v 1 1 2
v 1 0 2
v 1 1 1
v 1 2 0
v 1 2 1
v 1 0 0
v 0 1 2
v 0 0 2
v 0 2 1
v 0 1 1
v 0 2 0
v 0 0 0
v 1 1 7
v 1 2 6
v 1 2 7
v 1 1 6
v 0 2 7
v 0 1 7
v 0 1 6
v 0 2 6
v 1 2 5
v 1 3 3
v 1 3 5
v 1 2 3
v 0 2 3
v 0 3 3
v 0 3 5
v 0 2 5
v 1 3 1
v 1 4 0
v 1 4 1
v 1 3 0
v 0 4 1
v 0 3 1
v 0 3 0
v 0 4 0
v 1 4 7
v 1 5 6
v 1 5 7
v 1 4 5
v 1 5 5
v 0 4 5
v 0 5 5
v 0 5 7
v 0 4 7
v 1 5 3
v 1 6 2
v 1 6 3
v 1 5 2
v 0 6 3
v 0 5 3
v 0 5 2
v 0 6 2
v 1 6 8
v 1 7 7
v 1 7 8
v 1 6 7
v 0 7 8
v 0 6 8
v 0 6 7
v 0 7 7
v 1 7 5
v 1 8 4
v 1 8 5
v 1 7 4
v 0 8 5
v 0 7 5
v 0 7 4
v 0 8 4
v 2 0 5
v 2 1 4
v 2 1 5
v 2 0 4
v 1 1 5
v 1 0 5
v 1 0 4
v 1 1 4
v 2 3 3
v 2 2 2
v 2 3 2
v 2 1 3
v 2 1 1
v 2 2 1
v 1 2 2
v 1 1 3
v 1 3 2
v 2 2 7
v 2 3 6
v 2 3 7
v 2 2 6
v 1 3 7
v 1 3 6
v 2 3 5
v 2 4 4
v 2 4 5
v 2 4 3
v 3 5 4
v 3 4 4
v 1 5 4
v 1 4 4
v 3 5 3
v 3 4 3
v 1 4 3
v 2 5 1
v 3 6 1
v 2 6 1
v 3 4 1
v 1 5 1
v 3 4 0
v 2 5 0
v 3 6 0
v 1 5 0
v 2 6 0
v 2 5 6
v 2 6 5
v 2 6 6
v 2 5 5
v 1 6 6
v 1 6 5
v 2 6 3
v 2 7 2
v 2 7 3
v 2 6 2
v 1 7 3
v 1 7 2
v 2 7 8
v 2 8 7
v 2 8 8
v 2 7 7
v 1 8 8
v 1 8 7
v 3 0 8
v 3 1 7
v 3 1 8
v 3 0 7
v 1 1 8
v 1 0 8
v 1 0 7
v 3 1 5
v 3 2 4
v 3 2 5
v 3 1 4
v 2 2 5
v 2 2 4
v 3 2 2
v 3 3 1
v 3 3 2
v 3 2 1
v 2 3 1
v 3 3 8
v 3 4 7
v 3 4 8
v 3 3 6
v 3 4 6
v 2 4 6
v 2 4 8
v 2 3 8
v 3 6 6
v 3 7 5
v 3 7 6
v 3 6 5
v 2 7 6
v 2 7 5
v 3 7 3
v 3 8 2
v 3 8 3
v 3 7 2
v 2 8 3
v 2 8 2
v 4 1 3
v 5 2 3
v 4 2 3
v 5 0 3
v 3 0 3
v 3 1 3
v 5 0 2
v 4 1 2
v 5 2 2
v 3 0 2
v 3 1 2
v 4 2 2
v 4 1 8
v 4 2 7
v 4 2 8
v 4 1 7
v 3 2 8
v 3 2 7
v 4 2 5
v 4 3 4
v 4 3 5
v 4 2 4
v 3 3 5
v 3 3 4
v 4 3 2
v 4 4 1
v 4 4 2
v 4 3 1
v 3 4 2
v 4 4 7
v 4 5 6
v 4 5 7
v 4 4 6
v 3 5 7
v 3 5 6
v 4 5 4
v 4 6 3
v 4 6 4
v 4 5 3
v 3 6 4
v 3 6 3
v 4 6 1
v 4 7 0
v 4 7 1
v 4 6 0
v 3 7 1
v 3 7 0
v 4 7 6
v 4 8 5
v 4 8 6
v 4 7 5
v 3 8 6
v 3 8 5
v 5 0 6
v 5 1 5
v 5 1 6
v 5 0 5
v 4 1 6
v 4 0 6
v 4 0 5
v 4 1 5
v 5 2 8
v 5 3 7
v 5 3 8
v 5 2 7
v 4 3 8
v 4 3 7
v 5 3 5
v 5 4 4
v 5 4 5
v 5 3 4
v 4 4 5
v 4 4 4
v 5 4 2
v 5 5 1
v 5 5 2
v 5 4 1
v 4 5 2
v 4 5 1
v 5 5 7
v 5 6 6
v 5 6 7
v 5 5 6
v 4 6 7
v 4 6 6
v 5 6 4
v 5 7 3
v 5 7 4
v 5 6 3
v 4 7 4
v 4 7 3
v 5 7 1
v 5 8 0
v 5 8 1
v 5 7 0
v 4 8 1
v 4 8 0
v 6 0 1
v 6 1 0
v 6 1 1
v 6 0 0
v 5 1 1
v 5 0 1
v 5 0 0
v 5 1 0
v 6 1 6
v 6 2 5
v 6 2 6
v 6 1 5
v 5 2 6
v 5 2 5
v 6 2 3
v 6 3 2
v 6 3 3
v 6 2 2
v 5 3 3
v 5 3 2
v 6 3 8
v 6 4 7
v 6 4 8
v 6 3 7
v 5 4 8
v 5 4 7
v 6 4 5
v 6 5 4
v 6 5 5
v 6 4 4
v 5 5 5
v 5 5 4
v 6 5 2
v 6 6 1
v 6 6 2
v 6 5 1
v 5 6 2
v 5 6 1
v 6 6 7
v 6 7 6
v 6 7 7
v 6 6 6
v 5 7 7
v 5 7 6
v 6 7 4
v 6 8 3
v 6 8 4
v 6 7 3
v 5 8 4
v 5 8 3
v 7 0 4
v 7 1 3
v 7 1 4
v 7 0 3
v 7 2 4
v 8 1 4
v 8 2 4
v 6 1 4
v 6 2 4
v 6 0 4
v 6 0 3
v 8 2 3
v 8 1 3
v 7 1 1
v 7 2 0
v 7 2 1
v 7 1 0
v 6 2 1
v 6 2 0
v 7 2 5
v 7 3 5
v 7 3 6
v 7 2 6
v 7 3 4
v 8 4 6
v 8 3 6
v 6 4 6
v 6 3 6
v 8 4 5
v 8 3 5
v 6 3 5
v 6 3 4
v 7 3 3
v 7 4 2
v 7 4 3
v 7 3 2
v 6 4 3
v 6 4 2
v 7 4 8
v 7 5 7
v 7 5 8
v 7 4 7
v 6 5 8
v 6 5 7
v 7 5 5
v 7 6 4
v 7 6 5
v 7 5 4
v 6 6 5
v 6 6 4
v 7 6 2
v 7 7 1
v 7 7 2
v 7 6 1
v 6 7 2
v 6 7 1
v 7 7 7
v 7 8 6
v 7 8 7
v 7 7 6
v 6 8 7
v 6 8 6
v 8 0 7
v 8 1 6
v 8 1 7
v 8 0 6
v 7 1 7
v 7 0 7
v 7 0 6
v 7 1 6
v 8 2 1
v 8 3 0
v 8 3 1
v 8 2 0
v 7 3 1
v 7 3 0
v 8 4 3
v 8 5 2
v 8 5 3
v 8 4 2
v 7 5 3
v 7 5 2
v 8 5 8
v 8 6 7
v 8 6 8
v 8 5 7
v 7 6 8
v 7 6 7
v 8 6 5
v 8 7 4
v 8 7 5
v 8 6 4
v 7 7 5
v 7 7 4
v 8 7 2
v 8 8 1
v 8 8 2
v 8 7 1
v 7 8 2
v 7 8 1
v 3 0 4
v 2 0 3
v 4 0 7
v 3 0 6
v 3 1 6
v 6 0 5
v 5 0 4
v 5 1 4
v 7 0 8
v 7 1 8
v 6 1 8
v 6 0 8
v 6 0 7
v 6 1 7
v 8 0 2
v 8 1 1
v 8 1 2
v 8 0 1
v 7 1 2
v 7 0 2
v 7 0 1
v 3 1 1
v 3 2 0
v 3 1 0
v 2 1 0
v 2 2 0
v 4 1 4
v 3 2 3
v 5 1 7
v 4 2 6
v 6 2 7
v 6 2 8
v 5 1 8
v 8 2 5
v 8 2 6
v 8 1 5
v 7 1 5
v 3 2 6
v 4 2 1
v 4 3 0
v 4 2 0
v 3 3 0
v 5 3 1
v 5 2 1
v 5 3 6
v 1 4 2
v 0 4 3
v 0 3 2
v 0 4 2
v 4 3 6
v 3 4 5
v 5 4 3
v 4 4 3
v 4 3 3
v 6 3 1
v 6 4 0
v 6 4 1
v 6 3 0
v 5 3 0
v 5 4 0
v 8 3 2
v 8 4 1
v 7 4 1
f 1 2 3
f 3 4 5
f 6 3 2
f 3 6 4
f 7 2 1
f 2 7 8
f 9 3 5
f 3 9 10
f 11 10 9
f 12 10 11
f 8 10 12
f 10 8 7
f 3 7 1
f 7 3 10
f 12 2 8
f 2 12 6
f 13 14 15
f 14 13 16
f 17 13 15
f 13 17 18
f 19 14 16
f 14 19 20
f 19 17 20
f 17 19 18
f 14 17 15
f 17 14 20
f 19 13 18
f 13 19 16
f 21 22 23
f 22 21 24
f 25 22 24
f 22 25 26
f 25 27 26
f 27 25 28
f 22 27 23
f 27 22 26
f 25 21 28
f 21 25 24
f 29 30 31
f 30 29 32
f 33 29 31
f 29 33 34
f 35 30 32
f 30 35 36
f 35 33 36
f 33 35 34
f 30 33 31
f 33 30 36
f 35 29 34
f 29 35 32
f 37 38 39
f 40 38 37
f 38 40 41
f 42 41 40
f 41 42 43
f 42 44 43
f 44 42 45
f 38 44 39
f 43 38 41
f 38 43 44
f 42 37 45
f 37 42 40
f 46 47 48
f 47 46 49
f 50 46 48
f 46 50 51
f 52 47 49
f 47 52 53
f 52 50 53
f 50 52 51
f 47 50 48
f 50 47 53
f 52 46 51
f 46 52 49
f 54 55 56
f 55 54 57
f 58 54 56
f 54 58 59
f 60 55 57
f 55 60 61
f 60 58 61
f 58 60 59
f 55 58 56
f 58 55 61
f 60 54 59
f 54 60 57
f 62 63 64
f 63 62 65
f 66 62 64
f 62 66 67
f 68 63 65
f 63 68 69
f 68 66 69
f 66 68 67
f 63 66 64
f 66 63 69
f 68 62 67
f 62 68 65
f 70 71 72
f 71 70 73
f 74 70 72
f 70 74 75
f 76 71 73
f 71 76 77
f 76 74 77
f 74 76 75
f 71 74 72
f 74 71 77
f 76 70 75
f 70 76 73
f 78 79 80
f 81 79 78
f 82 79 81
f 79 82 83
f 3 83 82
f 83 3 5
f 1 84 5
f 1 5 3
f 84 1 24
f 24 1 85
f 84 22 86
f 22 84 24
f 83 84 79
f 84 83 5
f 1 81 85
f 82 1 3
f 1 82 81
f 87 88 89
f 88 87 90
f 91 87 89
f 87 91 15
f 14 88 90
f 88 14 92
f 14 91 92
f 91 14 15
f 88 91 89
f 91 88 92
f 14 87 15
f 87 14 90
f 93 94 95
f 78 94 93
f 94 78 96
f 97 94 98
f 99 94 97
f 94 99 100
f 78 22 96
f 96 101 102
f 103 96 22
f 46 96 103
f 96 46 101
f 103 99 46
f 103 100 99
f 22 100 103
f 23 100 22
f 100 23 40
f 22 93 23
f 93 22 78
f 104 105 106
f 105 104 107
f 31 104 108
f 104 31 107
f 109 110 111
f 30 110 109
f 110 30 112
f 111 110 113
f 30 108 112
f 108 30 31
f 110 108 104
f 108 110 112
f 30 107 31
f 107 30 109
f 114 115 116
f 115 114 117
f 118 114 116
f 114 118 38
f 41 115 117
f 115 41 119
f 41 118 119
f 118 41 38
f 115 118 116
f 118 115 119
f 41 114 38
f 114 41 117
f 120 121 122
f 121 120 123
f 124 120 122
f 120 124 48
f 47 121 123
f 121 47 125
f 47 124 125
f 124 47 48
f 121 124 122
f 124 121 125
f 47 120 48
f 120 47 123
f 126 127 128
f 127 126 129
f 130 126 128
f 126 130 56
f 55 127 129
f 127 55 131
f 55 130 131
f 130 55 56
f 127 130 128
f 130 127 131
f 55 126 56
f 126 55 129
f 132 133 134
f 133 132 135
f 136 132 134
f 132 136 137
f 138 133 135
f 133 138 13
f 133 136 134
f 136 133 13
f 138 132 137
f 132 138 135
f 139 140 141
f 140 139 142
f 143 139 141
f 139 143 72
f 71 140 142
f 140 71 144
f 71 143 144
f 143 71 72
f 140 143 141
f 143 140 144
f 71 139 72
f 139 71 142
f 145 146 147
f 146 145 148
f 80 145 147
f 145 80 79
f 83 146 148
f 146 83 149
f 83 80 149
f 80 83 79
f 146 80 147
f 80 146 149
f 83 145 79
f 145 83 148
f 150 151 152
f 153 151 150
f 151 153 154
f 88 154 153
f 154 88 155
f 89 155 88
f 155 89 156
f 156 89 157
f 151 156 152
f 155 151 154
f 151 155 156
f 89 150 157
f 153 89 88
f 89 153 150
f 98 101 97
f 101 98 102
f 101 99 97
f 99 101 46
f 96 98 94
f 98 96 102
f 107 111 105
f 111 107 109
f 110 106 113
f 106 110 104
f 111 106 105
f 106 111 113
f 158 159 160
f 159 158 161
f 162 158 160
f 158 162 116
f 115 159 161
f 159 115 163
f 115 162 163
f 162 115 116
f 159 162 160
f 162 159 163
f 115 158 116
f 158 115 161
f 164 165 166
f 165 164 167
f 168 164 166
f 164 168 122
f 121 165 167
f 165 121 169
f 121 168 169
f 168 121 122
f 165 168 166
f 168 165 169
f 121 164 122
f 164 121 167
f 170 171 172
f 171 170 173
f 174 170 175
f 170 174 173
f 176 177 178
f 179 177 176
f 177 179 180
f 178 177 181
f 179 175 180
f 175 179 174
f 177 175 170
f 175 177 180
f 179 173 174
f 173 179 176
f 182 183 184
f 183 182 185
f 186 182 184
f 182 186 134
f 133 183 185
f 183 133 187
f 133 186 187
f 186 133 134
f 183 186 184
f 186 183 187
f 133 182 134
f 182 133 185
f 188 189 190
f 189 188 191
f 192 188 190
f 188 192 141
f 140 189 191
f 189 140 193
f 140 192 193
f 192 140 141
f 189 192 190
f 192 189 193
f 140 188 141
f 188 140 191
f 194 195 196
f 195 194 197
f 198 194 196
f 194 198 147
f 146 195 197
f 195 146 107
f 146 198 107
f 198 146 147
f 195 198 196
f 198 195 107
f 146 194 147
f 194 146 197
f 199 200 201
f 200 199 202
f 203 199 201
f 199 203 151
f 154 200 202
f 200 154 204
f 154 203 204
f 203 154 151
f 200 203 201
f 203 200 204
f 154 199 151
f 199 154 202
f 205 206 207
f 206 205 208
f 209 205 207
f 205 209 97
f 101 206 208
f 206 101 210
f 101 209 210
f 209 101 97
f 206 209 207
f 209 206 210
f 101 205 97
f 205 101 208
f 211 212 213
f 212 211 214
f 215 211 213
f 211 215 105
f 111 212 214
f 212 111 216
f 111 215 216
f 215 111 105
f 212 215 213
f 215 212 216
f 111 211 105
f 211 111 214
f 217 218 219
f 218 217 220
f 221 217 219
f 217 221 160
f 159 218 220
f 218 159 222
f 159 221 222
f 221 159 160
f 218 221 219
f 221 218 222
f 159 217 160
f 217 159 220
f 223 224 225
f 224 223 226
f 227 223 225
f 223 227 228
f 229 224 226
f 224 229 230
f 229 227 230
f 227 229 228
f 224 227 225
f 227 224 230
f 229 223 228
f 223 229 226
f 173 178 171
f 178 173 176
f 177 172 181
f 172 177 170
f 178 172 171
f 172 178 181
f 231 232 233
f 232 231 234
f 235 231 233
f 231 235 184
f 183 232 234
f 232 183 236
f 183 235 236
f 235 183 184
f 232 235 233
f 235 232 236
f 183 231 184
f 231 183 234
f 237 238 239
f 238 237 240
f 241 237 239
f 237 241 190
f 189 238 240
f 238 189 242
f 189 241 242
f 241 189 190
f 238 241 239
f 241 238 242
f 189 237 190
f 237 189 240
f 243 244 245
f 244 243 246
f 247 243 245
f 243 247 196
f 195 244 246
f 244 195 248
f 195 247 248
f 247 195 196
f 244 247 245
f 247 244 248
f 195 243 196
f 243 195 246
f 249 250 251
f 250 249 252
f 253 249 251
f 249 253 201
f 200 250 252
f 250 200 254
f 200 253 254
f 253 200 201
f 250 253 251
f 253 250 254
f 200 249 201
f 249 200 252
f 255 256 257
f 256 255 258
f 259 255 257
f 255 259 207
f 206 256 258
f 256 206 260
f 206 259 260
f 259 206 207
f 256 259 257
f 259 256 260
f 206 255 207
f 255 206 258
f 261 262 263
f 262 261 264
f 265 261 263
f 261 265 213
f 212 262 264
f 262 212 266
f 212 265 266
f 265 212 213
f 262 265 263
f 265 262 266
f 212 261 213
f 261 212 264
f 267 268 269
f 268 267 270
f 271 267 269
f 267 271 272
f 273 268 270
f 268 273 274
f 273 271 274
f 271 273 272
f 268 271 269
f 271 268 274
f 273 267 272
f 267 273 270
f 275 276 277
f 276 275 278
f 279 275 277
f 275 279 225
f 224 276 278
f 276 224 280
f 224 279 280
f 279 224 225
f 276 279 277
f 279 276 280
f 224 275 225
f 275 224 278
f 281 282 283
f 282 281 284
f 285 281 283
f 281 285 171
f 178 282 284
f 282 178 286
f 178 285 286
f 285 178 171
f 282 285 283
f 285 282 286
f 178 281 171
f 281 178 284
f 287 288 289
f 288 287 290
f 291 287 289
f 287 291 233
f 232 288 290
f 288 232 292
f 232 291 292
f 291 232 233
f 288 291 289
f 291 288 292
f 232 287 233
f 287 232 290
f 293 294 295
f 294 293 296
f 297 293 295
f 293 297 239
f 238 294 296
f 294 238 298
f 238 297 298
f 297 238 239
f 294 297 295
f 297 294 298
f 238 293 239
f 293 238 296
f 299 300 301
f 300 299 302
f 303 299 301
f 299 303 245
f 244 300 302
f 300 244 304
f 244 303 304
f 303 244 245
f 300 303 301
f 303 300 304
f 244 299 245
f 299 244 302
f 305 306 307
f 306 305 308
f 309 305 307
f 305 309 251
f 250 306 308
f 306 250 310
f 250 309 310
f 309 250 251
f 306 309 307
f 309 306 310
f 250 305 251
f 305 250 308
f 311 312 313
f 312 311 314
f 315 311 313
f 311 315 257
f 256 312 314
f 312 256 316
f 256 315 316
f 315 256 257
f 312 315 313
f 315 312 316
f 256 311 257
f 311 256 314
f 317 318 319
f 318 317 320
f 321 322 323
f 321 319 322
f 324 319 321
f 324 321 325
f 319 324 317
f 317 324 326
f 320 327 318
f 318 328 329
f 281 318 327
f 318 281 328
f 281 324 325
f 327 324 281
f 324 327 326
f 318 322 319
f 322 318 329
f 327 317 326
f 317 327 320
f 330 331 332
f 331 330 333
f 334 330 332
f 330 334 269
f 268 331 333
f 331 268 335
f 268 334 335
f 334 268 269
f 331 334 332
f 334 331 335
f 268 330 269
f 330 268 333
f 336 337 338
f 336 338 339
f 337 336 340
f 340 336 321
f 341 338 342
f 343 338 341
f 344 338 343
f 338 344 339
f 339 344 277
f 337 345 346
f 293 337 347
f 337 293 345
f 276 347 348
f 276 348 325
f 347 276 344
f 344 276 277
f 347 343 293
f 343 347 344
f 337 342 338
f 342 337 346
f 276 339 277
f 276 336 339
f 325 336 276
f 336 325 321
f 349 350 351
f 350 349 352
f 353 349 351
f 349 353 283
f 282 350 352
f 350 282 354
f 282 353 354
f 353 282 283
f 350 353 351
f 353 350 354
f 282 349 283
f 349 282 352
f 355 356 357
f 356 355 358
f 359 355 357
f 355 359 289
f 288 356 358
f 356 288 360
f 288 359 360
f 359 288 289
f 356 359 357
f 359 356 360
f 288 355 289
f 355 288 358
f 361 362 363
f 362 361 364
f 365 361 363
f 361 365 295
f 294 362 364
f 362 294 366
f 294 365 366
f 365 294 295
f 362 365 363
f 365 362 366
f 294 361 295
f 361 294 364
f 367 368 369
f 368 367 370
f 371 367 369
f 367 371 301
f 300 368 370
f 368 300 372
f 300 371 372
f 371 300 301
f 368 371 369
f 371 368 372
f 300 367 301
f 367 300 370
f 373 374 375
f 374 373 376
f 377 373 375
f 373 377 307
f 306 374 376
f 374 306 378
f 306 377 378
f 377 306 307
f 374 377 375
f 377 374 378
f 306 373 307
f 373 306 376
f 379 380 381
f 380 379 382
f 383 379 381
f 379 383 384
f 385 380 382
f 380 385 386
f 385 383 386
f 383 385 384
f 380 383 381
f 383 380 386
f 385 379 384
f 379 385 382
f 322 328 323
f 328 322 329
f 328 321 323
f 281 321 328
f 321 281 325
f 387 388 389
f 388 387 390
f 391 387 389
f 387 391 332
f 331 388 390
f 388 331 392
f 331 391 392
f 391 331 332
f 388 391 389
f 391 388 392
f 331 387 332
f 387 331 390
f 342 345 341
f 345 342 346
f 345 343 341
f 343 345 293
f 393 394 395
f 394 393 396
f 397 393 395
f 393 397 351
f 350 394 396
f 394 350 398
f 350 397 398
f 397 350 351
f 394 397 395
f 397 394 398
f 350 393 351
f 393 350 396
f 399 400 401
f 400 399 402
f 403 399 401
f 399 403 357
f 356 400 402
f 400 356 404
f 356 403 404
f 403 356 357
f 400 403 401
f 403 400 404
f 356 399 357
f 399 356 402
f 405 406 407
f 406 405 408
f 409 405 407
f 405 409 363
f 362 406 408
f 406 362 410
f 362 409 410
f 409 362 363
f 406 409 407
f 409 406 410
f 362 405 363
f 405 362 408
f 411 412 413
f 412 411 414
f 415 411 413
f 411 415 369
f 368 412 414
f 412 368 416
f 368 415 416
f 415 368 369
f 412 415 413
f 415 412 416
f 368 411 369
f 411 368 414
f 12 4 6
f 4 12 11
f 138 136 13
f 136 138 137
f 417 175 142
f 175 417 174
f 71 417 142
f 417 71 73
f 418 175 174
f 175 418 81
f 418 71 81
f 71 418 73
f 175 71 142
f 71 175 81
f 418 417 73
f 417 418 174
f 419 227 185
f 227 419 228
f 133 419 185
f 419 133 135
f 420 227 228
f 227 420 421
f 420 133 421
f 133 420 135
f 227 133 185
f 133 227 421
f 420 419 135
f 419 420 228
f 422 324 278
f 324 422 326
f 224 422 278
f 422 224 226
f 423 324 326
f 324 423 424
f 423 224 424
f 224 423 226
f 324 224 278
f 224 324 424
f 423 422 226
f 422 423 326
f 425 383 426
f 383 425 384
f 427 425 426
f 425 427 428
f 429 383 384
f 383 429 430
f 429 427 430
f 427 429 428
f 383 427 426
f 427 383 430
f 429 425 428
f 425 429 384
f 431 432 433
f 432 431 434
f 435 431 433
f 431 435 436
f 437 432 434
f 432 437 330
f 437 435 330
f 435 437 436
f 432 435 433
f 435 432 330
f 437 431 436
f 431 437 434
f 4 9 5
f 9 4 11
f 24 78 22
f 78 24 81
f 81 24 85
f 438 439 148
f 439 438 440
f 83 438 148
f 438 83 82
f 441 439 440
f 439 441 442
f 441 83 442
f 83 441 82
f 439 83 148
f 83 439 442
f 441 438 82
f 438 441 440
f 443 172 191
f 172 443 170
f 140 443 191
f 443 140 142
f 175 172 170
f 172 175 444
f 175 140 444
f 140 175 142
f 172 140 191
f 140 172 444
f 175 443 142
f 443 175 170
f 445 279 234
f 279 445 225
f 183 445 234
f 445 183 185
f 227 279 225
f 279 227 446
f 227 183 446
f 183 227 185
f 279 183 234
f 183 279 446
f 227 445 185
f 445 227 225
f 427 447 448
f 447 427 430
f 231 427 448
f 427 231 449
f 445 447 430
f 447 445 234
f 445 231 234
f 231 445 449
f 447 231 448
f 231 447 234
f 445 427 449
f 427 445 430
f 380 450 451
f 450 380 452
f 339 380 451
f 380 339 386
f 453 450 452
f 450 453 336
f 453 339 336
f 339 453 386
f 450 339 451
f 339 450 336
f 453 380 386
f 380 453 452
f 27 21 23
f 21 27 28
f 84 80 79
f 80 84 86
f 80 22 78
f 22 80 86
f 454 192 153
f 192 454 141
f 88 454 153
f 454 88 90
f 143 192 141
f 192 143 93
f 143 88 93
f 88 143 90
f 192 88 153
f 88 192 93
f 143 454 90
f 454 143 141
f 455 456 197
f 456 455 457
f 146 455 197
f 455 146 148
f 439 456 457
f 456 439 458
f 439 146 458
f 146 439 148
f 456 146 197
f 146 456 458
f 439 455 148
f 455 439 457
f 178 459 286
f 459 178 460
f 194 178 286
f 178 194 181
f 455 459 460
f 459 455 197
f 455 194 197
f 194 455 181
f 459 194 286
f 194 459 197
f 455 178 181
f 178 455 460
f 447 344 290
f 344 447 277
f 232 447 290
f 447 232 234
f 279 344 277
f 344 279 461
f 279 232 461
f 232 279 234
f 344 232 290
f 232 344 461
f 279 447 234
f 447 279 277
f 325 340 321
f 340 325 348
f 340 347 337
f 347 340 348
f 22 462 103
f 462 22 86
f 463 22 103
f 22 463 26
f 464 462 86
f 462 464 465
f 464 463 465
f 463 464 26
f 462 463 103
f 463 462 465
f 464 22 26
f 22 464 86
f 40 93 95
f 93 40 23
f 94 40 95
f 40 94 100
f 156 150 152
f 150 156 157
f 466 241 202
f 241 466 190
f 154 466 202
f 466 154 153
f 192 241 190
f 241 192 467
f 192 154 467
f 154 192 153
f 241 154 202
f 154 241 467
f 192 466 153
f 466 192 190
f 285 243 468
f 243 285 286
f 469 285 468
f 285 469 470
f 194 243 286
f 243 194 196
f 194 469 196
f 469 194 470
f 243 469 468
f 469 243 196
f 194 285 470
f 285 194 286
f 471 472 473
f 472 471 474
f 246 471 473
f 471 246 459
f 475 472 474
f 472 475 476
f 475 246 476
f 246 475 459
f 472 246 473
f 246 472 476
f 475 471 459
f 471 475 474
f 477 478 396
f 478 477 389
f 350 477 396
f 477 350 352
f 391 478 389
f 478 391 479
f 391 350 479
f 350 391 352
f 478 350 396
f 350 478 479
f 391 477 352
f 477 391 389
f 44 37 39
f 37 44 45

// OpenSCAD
union() {
    translate([0, 0, 1]) cube([1, 1, 1]);
    translate([0, 1, 6]) cube([1, 1, 1]);
    translate([0, 2, 3]) cube([1, 1, 1]);
    translate([0, 3, 0]) cube([1, 1, 1]);
    translate([0, 4, 5]) cube([1, 1, 1]);
    translate([0, 5, 2]) cube([1, 1, 1]);
    translate([0, 6, 7]) cube([1, 1, 1]);
    translate([0, 7, 4]) cube([1, 1, 1]);
    translate([1, 0, 4]) cube([1, 1, 1]);
    translate([1, 1, 1]) cube([1, 1, 1]);
    translate([1, 2, 6]) cube([1, 1, 1]);
    translate([1, 3, 3]) cube([1, 1, 1]);
    translate([1, 4, 0]) cube([1, 1, 1]);
    translate([1, 5, 5]) cube([1, 1, 1]);
    translate([1, 6, 2]) cube([1, 1, 1]);
    translate([1, 7, 7]) cube([1, 1, 1]);
    translate([2, 0, 7]) cube([1, 1, 1]);
    translate([2, 1, 4]) cube([1, 1, 1]);
    translate([2, 2, 1]) cube([1, 1, 1]);
    translate([2, 3, 6]) cube([1, 1, 1]);
    translate([2, 4, 3]) cube([1, 1, 1]);
    translate([2, 5, 0]) cube([1, 1, 1]);
    translate([2, 6, 5]) cube([1, 1, 1]);
    translate([2, 7, 2]) cube([1, 1, 1]);
    translate([3, 0, 2]) cube([1, 1, 1]);
    translate([3, 1, 7]) cube([1, 1, 1]);
    translate([3, 2, 4]) cube([1, 1, 1]);
    translate([3, 3, 1]) cube([1, 1, 1]);
    translate([3, 4, 6]) cube([1, 1, 1]);
    translate([3, 5, 3]) cube([1, 1, 1]);
    translate([3, 6, 0]) cube([1, 1, 1]);
    translate([3, 7, 5]) cube([1, 1, 1]);
    translate([4, 0, 5]) cube([1, 1, 1]);
    translate([4, 1, 2]) cube([1, 1, 1]);
    translate([4, 2, 7]) cube([1, 1, 1]);
    translate([4, 3, 4]) cube([1, 1, 1]);
    translate([4, 4, 1]) cube([1, 1, 1]);
    translate([4, 5, 6]) cube([1, 1, 1]);
    translate([4, 6, 3]) cube([1, 1, 1]);
    translate([4, 7, 0]) cube([1, 1, 1]);
    translate([5, 0, 0]) cube([1, 1, 1]);
    translate([5, 1, 5]) cube([1, 1, 1]);
    translate([5, 2, 2]) cube([1, 1, 1]);
    translate([5, 3, 7]) cube([1, 1, 1]);
    translate([5, 4, 4]) cube([1, 1, 1]);
    translate([5, 5, 1]) cube([1, 1, 1]);
    translate([5, 6, 6]) cube([1, 1, 1]);
    translate([5, 7, 3]) cube([1, 1, 1]);
    translate([6, 0, 3]) cube([1, 1, 1]);
    translate([6, 1, 0]) cube([1, 1, 1]);
    translate([6, 2, 5]) cube([1, 1, 1]);
    translate([6, 3, 2]) cube([1, 1, 1]);
    translate([6, 4, 7]) cube([1, 1, 1]);
    translate([6, 5, 4]) cube([1, 1, 1]);
    translate([6, 6, 1]) cube([1, 1, 1]);
    translate([6, 7, 6]) cube([1, 1, 1]);
    translate([7, 0, 6]) cube([1, 1, 1]);
    translate([7, 1, 3]) cube([1, 1, 1]);
    translate([7, 2, 0]) cube([1, 1, 1]);
    translate([7, 3, 5]) cube([1, 1, 1]);
    translate([7, 4, 2]) cube([1, 1, 1]);
    translate([7, 5, 7]) cube([1, 1, 1]);
    translate([7, 6, 4]) cube([1, 1, 1]);
    translate([7, 7, 1]) cube([1, 1, 1]);
    translate([0, 0, 0]) cube([1, 1, 1]);
    translate([1, 0, 7]) cube([1, 1, 1]);
    translate([2, 0, 3]) cube([1, 1, 1]);
    translate([3, 0, 6]) cube([1, 1, 1]);
    translate([4, 0, 2]) cube([1, 1, 1]);
    translate([5, 0, 4]) cube([1, 1, 1]);
    translate([6, 0, 7]) cube([1, 1, 1]);
    translate([7, 0, 1]) cube([1, 1, 1]);
    translate([0, 1, 0]) cube([1, 1, 1]);
    translate([1, 1, 2]) cube([1, 1, 1]);
    translate([2, 1, 0]) cube([1, 1, 1]);
    translate([3, 1, 3]) cube([1, 1, 1]);
    translate([4, 1, 6]) cube([1, 1, 1]);
    translate([5, 1, 7]) cube([1, 1, 1]);
    translate([6, 1, 3]) cube([1, 1, 1]);
    translate([7, 1, 5]) cube([1, 1, 1]);
    translate([0, 2, 4]) cube([1, 1, 1]);
    translate([1, 2, 2]) cube([1, 1, 1]);
    translate([2, 2, 5]) cube([1, 1, 1]);
    translate([3, 2, 0]) cube([1, 1, 1]);
    translate([4, 2, 1]) cube([1, 1, 1]);
    translate([5, 2, 6]) cube([1, 1, 1]);
    translate([6, 2, 4]) cube([1, 1, 1]);
    translate([7, 2, 0]) cube([1, 1, 1]);
    translate([0, 3, 2]) cube([1, 1, 1]);
    translate([1, 3, 4]) cube([1, 1, 1]);
    translate([2, 3, 7]) cube([1, 1, 1]);
    translate([3, 3, 5]) cube([1, 1, 1]);
    translate([4, 3, 2]) cube([1, 1, 1]);
    translate([5, 3, 0]) cube([1, 1, 1]);
    translate([6, 3, 5]) cube([1, 1, 1]);
    translate([7, 3, 1]) cube([1, 1, 1]);
    translate([0, 4, 6]) cube([1, 1, 1]);
    translate([1, 4, 3]) cube([1, 1, 1]);
    translate([2, 4, 0]) cube([1, 1, 1]);
    translate([3, 4, 6]) cube([1, 1, 1]);
}
